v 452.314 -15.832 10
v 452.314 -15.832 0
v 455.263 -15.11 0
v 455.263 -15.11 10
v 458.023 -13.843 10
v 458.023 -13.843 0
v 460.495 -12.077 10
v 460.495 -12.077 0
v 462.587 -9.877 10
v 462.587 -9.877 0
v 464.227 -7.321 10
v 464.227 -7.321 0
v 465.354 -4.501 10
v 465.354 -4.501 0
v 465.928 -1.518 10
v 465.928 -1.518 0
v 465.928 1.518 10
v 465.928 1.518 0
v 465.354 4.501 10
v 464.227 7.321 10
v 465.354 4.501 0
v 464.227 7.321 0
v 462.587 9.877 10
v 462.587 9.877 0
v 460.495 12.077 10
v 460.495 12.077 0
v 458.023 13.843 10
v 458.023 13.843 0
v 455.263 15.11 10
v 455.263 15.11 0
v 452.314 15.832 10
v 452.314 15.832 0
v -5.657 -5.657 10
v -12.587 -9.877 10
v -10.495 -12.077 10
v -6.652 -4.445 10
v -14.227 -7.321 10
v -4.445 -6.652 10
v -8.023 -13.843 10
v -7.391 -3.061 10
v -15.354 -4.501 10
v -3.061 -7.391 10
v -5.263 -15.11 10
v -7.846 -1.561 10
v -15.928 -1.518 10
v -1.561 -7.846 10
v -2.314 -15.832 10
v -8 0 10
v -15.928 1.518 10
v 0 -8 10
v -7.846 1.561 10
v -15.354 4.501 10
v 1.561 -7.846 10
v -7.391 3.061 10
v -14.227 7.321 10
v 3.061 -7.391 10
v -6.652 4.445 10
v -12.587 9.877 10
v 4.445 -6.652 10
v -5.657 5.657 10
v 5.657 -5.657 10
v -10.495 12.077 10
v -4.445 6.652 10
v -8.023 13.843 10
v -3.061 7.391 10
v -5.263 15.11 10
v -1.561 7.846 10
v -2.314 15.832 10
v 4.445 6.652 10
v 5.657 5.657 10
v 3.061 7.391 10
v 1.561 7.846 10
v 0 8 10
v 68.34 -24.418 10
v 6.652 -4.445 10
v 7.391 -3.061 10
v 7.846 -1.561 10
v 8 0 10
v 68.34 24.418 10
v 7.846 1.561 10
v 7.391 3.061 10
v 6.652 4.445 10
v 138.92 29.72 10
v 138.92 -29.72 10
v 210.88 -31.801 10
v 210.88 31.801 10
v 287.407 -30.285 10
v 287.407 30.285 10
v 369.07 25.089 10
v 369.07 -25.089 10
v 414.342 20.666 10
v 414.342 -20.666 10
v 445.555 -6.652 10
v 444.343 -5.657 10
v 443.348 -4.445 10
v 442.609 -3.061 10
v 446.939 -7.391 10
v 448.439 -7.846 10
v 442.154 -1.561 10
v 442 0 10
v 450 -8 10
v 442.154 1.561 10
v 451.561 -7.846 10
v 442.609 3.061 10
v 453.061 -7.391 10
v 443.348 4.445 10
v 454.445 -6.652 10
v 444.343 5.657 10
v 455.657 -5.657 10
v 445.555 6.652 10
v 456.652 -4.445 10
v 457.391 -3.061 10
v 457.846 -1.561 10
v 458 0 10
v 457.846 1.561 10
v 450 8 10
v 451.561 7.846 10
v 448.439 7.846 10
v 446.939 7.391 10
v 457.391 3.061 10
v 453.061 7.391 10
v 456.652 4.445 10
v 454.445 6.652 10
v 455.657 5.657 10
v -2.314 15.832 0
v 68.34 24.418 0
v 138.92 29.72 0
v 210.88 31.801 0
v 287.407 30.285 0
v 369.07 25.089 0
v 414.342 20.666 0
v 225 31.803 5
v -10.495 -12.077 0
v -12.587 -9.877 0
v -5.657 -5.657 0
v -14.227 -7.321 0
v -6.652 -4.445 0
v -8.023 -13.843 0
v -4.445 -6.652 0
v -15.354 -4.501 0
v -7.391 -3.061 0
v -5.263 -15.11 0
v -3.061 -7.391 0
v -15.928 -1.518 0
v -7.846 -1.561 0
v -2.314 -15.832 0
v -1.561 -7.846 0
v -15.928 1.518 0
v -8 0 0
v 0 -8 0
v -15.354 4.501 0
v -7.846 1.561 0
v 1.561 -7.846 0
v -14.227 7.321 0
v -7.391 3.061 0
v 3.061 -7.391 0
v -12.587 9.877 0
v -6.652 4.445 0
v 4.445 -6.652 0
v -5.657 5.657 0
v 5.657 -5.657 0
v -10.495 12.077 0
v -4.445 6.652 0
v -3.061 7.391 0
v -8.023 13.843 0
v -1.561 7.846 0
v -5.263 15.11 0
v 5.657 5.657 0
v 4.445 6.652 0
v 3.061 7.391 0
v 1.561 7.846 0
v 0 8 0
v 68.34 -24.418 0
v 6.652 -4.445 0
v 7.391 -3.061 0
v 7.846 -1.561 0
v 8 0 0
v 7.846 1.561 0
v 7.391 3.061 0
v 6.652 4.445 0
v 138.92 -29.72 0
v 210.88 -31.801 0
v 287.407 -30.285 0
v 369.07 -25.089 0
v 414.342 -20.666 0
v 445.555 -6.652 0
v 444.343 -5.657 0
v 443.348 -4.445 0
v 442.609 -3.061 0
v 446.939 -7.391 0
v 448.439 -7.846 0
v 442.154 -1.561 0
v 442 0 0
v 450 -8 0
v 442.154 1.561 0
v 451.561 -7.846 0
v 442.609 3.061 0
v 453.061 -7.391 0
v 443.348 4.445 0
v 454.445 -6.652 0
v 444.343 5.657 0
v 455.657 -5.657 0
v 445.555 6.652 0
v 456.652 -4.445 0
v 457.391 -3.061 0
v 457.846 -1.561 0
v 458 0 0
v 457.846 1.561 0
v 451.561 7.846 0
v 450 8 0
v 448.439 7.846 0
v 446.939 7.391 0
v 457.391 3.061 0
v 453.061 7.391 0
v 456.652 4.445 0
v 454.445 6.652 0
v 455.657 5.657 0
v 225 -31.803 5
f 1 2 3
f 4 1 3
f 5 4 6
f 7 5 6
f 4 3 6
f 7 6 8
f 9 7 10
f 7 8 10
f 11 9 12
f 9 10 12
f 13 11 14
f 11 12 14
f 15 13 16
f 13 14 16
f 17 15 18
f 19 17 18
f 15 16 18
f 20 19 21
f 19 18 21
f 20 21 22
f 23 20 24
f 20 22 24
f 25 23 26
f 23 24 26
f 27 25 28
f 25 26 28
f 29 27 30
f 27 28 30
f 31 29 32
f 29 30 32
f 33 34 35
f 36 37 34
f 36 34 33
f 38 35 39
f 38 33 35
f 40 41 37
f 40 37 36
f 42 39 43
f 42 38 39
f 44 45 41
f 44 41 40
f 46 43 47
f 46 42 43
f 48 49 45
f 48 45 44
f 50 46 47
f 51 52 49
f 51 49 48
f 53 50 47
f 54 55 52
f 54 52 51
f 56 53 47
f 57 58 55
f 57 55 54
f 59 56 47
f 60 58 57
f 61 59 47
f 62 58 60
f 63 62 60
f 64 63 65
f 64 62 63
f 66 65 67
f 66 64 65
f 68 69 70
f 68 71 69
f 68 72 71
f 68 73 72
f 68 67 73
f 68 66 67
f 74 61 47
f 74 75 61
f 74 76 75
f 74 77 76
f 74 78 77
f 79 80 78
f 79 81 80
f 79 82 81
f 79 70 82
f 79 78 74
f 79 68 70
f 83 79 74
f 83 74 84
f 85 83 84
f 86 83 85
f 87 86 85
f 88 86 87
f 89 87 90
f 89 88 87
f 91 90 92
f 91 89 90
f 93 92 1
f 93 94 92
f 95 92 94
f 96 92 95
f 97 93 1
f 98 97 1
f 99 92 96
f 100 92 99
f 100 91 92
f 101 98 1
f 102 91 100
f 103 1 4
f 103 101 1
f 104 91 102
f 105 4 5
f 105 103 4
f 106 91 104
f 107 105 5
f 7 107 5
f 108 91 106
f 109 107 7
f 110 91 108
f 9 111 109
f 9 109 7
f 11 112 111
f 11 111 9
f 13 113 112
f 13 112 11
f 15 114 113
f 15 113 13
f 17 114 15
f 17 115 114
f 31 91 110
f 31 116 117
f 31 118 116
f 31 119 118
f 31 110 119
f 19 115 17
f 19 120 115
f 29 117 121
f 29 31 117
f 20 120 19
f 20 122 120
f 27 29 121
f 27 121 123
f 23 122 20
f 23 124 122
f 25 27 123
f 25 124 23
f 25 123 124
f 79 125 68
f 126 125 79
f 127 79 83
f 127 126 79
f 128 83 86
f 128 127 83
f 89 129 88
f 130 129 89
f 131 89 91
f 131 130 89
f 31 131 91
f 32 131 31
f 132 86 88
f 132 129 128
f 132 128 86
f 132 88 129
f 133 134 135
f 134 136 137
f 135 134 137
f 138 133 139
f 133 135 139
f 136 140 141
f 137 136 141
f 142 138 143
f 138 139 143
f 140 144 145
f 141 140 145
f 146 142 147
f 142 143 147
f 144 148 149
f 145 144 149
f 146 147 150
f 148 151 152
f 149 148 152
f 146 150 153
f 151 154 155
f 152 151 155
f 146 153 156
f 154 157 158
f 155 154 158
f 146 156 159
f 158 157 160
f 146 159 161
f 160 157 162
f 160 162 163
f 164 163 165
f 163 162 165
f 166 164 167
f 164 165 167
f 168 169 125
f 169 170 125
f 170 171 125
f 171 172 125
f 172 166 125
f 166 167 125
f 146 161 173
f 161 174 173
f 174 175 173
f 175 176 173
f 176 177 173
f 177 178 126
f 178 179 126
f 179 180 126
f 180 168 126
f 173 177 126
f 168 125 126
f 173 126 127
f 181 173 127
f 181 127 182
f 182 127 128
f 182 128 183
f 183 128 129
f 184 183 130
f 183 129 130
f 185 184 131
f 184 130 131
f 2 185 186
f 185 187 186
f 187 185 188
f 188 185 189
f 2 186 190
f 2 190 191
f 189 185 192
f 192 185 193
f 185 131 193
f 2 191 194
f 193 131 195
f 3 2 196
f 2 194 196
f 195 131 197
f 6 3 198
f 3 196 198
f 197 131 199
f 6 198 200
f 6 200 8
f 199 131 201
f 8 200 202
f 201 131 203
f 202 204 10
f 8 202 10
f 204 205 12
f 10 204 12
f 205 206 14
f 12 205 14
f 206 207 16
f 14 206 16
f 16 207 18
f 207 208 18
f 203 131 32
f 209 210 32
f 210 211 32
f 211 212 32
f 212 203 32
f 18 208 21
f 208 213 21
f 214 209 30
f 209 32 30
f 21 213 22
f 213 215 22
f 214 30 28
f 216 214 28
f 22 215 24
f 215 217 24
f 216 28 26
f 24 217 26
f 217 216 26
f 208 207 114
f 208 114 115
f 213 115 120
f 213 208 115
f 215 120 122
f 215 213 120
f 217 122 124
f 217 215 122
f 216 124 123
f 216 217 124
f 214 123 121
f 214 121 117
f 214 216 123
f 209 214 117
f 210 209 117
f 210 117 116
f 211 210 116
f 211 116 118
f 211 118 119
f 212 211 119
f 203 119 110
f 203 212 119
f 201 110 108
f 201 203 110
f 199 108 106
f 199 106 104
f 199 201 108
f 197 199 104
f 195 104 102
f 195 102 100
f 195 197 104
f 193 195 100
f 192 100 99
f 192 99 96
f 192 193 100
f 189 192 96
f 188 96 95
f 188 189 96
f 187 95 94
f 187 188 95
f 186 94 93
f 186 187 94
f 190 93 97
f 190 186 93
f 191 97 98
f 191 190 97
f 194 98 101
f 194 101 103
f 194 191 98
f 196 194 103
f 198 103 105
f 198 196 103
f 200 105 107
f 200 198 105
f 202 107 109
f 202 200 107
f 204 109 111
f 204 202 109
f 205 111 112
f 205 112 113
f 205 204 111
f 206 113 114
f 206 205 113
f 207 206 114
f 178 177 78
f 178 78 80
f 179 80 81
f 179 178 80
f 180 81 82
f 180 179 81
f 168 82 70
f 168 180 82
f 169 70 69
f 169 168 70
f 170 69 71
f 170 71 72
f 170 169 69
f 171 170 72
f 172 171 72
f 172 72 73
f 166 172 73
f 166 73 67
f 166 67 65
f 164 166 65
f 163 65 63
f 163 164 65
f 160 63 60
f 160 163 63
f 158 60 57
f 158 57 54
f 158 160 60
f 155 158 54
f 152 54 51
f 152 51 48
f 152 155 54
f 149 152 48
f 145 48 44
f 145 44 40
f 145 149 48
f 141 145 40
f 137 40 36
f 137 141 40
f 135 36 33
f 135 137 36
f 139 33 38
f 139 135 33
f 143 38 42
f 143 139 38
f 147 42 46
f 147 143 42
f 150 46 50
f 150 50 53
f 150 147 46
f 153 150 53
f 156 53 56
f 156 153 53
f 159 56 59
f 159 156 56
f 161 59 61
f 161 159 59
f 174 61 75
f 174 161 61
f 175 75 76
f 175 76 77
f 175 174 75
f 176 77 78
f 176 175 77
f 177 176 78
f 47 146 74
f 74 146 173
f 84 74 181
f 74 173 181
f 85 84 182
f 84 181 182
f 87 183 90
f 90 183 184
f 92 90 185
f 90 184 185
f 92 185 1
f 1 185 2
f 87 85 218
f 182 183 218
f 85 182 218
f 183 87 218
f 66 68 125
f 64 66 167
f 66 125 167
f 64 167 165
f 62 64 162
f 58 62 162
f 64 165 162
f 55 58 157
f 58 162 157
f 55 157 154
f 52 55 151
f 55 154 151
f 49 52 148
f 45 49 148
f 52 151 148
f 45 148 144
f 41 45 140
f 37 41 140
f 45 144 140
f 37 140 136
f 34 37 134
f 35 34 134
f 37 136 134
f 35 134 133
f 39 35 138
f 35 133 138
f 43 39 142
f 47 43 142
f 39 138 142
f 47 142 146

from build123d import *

# Parameters (mm, degrees)
SKETCH_1_R      = 8
EXTRUDE_1_DEPTH = 10


with BuildPart() as part:
    # 草图1 → 凸台-拉伸1 (new body)
    with BuildSketch(Plane.XY):
        with BuildLine():
            ThreePointArc((-2.313590971, 15.831844391), (-16, 0), (-2.313590971, -15.831844391))
            add(Edge.make_bspline(
                [(-2.313590971, -15.831844391), (61.84269778, -25.207341442), (219.572103506, -39.191033108), (399.013095208, -23.620927123), (452.313590971, -15.831844391)],
                knots=[0, 0, 0, 0, 0.5, 1, 1, 1, 1], degree=3))
            ThreePointArc((452.313590971, -15.831844391), (466, 0), (452.313590971, 15.831844391))
            add(Edge.make_bspline(
                [(-2.313590971, 15.831844391), (61.84269778, 25.207341442), (219.572103506, 39.191033108), (399.013095208, 23.620927123), (452.313590971, 15.831844391)],
                knots=[0, 0, 0, 0, 0.5, 1, 1, 1, 1], degree=3))
        make_face()
        Circle(SKETCH_1_R, mode=Mode.SUBTRACT)
        with Locations((450, 0)):
            Circle(SKETCH_1_R, mode=Mode.SUBTRACT)
    extrude(amount=EXTRUDE_1_DEPTH)


solid = part.part
